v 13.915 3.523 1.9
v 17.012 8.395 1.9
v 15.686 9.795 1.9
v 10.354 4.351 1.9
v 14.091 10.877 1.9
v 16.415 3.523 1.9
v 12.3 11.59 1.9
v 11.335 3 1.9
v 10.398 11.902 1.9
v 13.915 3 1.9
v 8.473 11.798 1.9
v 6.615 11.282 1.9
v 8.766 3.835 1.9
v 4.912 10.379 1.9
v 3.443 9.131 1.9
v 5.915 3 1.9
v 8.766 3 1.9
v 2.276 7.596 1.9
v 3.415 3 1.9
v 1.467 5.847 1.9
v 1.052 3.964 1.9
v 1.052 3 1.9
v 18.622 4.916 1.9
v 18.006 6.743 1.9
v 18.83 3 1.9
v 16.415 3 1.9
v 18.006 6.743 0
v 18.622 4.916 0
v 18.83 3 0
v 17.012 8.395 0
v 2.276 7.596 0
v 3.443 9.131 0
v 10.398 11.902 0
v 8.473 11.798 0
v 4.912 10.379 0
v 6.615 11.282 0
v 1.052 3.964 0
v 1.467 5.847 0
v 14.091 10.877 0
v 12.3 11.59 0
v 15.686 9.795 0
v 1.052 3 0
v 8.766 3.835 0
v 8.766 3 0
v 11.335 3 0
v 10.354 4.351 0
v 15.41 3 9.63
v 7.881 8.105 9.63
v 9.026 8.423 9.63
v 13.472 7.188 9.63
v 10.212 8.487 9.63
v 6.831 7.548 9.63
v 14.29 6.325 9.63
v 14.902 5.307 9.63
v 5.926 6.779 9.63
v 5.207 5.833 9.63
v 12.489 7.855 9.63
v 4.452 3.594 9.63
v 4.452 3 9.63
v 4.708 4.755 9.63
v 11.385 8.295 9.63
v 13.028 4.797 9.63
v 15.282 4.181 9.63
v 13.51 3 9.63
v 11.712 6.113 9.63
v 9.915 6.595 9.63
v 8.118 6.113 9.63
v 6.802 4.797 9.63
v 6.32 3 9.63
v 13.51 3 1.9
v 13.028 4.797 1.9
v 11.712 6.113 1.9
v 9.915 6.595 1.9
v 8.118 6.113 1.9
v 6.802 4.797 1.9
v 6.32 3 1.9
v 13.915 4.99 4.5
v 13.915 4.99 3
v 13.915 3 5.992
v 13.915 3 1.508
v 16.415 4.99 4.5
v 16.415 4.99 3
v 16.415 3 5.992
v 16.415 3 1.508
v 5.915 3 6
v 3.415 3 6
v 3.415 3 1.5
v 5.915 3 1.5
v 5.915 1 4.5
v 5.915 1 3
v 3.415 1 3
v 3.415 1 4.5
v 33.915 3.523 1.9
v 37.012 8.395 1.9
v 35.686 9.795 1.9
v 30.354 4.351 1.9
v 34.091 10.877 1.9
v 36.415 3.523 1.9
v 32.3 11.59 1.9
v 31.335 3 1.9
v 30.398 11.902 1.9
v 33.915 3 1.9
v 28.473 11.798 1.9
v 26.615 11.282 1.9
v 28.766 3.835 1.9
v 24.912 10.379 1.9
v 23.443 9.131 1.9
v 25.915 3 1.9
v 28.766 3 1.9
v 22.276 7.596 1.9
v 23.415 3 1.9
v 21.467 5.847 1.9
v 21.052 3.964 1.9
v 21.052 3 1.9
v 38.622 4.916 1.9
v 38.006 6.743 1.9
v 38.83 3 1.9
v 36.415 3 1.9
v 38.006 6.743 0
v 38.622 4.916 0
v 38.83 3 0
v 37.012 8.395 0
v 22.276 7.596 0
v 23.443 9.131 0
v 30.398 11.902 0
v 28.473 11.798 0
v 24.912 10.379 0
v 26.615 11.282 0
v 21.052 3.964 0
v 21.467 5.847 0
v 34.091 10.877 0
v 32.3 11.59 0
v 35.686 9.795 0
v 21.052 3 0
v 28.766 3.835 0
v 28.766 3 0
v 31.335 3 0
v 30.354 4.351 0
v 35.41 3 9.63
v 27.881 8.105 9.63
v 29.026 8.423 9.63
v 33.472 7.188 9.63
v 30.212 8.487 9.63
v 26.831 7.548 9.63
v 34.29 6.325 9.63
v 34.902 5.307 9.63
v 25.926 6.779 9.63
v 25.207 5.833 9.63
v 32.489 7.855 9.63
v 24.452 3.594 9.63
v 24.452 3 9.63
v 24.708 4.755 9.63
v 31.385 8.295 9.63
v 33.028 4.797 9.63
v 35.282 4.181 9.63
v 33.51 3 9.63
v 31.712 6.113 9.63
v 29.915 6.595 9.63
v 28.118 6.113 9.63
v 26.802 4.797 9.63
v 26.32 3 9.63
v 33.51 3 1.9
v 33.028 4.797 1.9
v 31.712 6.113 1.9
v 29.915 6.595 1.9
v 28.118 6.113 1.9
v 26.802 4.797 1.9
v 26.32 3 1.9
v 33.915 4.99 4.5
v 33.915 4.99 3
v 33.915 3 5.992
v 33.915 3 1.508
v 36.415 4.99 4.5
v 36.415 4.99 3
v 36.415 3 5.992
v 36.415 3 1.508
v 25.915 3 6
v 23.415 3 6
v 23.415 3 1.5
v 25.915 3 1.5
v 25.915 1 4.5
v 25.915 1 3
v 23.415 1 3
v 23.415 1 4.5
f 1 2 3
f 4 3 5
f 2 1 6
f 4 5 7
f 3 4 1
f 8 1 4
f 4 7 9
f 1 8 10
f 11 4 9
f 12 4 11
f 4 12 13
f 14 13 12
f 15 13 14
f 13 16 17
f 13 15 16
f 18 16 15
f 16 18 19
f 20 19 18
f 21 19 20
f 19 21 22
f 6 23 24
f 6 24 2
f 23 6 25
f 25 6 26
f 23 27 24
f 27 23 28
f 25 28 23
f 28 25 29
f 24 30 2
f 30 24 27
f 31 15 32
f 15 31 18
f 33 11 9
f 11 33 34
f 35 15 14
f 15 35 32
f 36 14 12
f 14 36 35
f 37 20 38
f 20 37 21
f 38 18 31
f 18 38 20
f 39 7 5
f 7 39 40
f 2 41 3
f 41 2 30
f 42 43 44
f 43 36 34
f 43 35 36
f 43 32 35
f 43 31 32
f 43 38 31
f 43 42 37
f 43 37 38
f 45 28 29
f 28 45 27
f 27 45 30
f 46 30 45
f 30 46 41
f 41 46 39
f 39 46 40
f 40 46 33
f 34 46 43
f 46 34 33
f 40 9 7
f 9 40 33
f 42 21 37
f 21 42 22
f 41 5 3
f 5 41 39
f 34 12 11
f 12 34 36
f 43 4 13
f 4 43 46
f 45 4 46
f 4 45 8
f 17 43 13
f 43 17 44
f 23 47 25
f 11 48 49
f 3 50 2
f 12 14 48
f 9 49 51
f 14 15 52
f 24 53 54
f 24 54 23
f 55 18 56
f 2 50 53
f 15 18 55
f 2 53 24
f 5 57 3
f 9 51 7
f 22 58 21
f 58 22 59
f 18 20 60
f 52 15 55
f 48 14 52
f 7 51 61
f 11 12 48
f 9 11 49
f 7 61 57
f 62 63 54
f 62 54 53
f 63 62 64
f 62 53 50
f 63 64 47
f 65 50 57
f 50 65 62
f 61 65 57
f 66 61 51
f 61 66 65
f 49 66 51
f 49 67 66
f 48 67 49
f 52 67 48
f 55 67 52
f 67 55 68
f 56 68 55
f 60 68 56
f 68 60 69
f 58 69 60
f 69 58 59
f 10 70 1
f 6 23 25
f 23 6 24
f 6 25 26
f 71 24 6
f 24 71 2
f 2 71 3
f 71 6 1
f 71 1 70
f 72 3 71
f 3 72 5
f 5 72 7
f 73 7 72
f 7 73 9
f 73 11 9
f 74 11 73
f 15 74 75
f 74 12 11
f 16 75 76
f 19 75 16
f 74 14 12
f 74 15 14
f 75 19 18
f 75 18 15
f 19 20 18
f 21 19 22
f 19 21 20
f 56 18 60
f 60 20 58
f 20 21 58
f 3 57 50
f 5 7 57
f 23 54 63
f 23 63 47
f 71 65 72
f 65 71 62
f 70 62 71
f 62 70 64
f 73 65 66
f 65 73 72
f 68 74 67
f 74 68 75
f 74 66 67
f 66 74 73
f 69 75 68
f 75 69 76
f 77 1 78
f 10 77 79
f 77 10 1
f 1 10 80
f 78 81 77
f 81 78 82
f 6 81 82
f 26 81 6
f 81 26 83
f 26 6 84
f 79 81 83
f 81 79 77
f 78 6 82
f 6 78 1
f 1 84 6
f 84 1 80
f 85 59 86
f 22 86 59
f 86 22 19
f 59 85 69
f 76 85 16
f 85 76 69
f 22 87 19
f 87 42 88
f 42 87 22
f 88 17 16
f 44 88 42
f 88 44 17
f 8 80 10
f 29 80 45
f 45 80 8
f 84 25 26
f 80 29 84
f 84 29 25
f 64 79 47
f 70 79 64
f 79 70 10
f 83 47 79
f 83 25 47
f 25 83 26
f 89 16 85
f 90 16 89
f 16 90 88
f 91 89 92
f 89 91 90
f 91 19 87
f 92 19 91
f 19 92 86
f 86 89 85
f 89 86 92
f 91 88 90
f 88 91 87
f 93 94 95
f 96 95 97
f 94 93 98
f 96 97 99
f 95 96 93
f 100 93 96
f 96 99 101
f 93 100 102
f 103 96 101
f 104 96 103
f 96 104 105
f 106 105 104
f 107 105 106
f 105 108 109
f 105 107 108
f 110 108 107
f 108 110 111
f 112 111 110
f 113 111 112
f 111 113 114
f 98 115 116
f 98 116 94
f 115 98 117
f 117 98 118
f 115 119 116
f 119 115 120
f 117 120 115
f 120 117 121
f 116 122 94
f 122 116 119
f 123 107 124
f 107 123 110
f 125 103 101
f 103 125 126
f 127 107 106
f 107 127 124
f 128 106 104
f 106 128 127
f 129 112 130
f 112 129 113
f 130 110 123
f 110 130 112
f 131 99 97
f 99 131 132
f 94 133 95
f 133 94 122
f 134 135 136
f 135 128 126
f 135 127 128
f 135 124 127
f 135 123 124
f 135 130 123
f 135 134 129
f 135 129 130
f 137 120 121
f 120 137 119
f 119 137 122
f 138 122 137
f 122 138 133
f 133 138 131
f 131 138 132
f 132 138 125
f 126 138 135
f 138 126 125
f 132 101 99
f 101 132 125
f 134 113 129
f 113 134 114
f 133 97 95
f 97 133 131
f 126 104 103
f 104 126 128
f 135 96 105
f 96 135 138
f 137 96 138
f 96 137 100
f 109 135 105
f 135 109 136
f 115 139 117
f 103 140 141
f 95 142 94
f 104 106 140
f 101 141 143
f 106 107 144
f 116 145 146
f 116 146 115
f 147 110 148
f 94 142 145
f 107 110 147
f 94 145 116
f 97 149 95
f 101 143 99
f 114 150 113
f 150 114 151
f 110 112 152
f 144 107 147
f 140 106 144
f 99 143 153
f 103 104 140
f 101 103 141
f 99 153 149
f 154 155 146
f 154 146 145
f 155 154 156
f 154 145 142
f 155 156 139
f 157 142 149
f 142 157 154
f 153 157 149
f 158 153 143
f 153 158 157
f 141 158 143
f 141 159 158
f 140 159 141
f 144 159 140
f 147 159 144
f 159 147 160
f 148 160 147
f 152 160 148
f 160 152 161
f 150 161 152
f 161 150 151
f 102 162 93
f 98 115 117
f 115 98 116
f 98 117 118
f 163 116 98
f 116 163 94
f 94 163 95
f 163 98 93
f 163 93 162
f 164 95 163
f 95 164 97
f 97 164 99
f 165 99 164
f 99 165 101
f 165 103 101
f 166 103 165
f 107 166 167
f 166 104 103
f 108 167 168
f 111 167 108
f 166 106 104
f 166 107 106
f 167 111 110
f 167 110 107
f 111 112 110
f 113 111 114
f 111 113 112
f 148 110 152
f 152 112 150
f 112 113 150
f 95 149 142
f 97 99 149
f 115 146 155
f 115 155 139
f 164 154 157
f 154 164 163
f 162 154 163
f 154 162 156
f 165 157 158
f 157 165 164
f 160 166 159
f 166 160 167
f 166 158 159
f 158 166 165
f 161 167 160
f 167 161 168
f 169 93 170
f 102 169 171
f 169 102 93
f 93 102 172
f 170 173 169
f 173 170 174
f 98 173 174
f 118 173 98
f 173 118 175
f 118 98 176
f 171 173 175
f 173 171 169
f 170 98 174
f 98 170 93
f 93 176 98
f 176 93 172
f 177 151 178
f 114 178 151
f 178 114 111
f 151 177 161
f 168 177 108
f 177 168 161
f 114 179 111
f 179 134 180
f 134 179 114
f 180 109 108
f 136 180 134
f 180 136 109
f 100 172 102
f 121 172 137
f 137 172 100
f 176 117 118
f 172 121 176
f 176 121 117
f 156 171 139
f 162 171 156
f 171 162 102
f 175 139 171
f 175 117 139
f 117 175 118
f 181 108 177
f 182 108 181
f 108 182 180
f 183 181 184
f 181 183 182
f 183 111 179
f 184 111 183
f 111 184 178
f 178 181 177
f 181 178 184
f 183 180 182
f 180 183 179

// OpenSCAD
union() {

	// First half
	translate([9.915, 3, 0])
	union() {
		difference() {
			union() {
				difference() {
					cylinder(h = 1.9, r = 8.915);
					cylinder(h = 1.9, r = 1.42);
				}
				translate([0,0,1.9])
				difference() {
					cylinder(h = 7.73, r1 = 8.915, r2 = 5.495);
					cylinder(h = 7.73, r = 3.595);
				}
			}
			translate([0,-4.815,4.815])
			cube (size = [17.83,9.63,9.7], center = true);

			// groove
			translate([5.25,1.99,0])
			rotate([0,0,270]) {
				difference() {
					translate([0,-1.25,1.5])
					cube (size = [2,2.5,4.5], center = false);
					translate([0,0,-15.5])
					union() {
						polyhedron ( points = [[0, -1.25, 21.5], [0, 1.25, 21.5], [0, 1.25, 20], 
									[0, -1.25, 20], [2, -1.25, 21.5], [2, 1.25, 21.5]], 
						  triangles = [[0,3,2], [0,2,1],  [3,0,4], [1,2,5], 
									   [0,5,4], [0,1,5],  [5,2,4], [4,2,3], ]);
						polyhedron ( points = [[0, -1.25, 18.5], [0, 1.25, 18.5], [0, 1.25, 17], 
									[0, -1.25, 17], [2, -1.25, 17], [2, 1.25, 17]], 
						  triangles = [[0,3,2], [0,2,1],  [3,0,4], [1,2,5], 
									   [0,5,4], [0,1,5],  [5,2,4], [4,2,3], ]);
					}
				}
			}

		}
		translate([-5.25,-2,0])
		rotate([0,0,90]) {
			difference() {
				translate([0,-1.25,1.5])
				cube (size = [2,2.5,4.5], center = false);
				translate([0,0,-15.5])
				union() {
					polyhedron ( points = [[0, -1.25, 21.5], [0, 1.25, 21.5], [0, 1.25, 20], 
								[0, -1.25, 20], [2, -1.25, 21.5], [2, 1.25, 21.5]], 
					  triangles = [[0,3,2], [0,2,1],  [3,0,4], [1,2,5], 
								   [0,5,4], [0,1,5],  [5,2,4], [4,2,3], ]);
					polyhedron ( points = [[0, -1.25, 18.5], [0, 1.25, 18.5], [0, 1.25, 17], 
								[0, -1.25, 17], [2, -1.25, 17], [2, 1.25, 17]], 
					  triangles = [[0,3,2], [0,2,1],  [3,0,4], [1,2,5], 
								   [0,5,4], [0,1,5],  [5,2,4], [4,2,3], ]);
				}
			}
		}
	}

	// Second half
	translate([29.915, 3, 0])
	union() {
		difference() {
			union() {
				difference() {
					cylinder(h = 1.9, r = 8.915);
					cylinder(h = 1.9, r = 1.42);
				}
				translate([0,0,1.9])
				difference() {
					cylinder(h = 7.73, r1 = 8.915, r2 = 5.495);
					cylinder(h = 7.73, r = 3.595);
				}
			}
			translate([0,-4.815,4.815])
			cube (size = [17.83,9.63,9.7], center = true);

			// groove
			translate([5.25,1.99,0])
			rotate([0,0,270]) {
				difference() {
					translate([0,-1.25,1.5])
					cube (size = [2,2.5,4.5], center = false);
					translate([0,0,-15.5])
					union() {
						polyhedron ( points = [[0, -1.25, 21.5], [0, 1.25, 21.5], [0, 1.25, 20], 
									[0, -1.25, 20], [2, -1.25, 21.5], [2, 1.25, 21.5]], 
						  triangles = [[0,3,2], [0,2,1],  [3,0,4], [1,2,5], 
									   [0,5,4], [0,1,5],  [5,2,4], [4,2,3], ]);
						polyhedron ( points = [[0, -1.25, 18.5], [0, 1.25, 18.5], [0, 1.25, 17], 
									[0, -1.25, 17], [2, -1.25, 17], [2, 1.25, 17]], 
						  triangles = [[0,3,2], [0,2,1],  [3,0,4], [1,2,5], 
									   [0,5,4], [0,1,5],  [5,2,4], [4,2,3], ]);
					}
				}
			}

		}
		translate([-5.25,-2,0])
		rotate([0,0,90]) {
			difference() {
				translate([0,-1.25,1.5])
				cube (size = [2,2.5,4.5], center = false);
				translate([0,0,-15.5])
				union() {
					polyhedron ( points = [[0, -1.25, 21.5], [0, 1.25, 21.5], [0, 1.25, 20], 
								[0, -1.25, 20], [2, -1.25, 21.5], [2, 1.25, 21.5]], 
					  triangles = [[0,3,2], [0,2,1],  [3,0,4], [1,2,5], 
								   [0,5,4], [0,1,5],  [5,2,4], [4,2,3], ]);
					polyhedron ( points = [[0, -1.25, 18.5], [0, 1.25, 18.5], [0, 1.25, 17], 
								[0, -1.25, 17], [2, -1.25, 17], [2, 1.25, 17]], 
					  triangles = [[0,3,2], [0,2,1],  [3,0,4], [1,2,5], 
								   [0,5,4], [0,1,5],  [5,2,4], [4,2,3], ]);
				}
			}
		}
	}

}
